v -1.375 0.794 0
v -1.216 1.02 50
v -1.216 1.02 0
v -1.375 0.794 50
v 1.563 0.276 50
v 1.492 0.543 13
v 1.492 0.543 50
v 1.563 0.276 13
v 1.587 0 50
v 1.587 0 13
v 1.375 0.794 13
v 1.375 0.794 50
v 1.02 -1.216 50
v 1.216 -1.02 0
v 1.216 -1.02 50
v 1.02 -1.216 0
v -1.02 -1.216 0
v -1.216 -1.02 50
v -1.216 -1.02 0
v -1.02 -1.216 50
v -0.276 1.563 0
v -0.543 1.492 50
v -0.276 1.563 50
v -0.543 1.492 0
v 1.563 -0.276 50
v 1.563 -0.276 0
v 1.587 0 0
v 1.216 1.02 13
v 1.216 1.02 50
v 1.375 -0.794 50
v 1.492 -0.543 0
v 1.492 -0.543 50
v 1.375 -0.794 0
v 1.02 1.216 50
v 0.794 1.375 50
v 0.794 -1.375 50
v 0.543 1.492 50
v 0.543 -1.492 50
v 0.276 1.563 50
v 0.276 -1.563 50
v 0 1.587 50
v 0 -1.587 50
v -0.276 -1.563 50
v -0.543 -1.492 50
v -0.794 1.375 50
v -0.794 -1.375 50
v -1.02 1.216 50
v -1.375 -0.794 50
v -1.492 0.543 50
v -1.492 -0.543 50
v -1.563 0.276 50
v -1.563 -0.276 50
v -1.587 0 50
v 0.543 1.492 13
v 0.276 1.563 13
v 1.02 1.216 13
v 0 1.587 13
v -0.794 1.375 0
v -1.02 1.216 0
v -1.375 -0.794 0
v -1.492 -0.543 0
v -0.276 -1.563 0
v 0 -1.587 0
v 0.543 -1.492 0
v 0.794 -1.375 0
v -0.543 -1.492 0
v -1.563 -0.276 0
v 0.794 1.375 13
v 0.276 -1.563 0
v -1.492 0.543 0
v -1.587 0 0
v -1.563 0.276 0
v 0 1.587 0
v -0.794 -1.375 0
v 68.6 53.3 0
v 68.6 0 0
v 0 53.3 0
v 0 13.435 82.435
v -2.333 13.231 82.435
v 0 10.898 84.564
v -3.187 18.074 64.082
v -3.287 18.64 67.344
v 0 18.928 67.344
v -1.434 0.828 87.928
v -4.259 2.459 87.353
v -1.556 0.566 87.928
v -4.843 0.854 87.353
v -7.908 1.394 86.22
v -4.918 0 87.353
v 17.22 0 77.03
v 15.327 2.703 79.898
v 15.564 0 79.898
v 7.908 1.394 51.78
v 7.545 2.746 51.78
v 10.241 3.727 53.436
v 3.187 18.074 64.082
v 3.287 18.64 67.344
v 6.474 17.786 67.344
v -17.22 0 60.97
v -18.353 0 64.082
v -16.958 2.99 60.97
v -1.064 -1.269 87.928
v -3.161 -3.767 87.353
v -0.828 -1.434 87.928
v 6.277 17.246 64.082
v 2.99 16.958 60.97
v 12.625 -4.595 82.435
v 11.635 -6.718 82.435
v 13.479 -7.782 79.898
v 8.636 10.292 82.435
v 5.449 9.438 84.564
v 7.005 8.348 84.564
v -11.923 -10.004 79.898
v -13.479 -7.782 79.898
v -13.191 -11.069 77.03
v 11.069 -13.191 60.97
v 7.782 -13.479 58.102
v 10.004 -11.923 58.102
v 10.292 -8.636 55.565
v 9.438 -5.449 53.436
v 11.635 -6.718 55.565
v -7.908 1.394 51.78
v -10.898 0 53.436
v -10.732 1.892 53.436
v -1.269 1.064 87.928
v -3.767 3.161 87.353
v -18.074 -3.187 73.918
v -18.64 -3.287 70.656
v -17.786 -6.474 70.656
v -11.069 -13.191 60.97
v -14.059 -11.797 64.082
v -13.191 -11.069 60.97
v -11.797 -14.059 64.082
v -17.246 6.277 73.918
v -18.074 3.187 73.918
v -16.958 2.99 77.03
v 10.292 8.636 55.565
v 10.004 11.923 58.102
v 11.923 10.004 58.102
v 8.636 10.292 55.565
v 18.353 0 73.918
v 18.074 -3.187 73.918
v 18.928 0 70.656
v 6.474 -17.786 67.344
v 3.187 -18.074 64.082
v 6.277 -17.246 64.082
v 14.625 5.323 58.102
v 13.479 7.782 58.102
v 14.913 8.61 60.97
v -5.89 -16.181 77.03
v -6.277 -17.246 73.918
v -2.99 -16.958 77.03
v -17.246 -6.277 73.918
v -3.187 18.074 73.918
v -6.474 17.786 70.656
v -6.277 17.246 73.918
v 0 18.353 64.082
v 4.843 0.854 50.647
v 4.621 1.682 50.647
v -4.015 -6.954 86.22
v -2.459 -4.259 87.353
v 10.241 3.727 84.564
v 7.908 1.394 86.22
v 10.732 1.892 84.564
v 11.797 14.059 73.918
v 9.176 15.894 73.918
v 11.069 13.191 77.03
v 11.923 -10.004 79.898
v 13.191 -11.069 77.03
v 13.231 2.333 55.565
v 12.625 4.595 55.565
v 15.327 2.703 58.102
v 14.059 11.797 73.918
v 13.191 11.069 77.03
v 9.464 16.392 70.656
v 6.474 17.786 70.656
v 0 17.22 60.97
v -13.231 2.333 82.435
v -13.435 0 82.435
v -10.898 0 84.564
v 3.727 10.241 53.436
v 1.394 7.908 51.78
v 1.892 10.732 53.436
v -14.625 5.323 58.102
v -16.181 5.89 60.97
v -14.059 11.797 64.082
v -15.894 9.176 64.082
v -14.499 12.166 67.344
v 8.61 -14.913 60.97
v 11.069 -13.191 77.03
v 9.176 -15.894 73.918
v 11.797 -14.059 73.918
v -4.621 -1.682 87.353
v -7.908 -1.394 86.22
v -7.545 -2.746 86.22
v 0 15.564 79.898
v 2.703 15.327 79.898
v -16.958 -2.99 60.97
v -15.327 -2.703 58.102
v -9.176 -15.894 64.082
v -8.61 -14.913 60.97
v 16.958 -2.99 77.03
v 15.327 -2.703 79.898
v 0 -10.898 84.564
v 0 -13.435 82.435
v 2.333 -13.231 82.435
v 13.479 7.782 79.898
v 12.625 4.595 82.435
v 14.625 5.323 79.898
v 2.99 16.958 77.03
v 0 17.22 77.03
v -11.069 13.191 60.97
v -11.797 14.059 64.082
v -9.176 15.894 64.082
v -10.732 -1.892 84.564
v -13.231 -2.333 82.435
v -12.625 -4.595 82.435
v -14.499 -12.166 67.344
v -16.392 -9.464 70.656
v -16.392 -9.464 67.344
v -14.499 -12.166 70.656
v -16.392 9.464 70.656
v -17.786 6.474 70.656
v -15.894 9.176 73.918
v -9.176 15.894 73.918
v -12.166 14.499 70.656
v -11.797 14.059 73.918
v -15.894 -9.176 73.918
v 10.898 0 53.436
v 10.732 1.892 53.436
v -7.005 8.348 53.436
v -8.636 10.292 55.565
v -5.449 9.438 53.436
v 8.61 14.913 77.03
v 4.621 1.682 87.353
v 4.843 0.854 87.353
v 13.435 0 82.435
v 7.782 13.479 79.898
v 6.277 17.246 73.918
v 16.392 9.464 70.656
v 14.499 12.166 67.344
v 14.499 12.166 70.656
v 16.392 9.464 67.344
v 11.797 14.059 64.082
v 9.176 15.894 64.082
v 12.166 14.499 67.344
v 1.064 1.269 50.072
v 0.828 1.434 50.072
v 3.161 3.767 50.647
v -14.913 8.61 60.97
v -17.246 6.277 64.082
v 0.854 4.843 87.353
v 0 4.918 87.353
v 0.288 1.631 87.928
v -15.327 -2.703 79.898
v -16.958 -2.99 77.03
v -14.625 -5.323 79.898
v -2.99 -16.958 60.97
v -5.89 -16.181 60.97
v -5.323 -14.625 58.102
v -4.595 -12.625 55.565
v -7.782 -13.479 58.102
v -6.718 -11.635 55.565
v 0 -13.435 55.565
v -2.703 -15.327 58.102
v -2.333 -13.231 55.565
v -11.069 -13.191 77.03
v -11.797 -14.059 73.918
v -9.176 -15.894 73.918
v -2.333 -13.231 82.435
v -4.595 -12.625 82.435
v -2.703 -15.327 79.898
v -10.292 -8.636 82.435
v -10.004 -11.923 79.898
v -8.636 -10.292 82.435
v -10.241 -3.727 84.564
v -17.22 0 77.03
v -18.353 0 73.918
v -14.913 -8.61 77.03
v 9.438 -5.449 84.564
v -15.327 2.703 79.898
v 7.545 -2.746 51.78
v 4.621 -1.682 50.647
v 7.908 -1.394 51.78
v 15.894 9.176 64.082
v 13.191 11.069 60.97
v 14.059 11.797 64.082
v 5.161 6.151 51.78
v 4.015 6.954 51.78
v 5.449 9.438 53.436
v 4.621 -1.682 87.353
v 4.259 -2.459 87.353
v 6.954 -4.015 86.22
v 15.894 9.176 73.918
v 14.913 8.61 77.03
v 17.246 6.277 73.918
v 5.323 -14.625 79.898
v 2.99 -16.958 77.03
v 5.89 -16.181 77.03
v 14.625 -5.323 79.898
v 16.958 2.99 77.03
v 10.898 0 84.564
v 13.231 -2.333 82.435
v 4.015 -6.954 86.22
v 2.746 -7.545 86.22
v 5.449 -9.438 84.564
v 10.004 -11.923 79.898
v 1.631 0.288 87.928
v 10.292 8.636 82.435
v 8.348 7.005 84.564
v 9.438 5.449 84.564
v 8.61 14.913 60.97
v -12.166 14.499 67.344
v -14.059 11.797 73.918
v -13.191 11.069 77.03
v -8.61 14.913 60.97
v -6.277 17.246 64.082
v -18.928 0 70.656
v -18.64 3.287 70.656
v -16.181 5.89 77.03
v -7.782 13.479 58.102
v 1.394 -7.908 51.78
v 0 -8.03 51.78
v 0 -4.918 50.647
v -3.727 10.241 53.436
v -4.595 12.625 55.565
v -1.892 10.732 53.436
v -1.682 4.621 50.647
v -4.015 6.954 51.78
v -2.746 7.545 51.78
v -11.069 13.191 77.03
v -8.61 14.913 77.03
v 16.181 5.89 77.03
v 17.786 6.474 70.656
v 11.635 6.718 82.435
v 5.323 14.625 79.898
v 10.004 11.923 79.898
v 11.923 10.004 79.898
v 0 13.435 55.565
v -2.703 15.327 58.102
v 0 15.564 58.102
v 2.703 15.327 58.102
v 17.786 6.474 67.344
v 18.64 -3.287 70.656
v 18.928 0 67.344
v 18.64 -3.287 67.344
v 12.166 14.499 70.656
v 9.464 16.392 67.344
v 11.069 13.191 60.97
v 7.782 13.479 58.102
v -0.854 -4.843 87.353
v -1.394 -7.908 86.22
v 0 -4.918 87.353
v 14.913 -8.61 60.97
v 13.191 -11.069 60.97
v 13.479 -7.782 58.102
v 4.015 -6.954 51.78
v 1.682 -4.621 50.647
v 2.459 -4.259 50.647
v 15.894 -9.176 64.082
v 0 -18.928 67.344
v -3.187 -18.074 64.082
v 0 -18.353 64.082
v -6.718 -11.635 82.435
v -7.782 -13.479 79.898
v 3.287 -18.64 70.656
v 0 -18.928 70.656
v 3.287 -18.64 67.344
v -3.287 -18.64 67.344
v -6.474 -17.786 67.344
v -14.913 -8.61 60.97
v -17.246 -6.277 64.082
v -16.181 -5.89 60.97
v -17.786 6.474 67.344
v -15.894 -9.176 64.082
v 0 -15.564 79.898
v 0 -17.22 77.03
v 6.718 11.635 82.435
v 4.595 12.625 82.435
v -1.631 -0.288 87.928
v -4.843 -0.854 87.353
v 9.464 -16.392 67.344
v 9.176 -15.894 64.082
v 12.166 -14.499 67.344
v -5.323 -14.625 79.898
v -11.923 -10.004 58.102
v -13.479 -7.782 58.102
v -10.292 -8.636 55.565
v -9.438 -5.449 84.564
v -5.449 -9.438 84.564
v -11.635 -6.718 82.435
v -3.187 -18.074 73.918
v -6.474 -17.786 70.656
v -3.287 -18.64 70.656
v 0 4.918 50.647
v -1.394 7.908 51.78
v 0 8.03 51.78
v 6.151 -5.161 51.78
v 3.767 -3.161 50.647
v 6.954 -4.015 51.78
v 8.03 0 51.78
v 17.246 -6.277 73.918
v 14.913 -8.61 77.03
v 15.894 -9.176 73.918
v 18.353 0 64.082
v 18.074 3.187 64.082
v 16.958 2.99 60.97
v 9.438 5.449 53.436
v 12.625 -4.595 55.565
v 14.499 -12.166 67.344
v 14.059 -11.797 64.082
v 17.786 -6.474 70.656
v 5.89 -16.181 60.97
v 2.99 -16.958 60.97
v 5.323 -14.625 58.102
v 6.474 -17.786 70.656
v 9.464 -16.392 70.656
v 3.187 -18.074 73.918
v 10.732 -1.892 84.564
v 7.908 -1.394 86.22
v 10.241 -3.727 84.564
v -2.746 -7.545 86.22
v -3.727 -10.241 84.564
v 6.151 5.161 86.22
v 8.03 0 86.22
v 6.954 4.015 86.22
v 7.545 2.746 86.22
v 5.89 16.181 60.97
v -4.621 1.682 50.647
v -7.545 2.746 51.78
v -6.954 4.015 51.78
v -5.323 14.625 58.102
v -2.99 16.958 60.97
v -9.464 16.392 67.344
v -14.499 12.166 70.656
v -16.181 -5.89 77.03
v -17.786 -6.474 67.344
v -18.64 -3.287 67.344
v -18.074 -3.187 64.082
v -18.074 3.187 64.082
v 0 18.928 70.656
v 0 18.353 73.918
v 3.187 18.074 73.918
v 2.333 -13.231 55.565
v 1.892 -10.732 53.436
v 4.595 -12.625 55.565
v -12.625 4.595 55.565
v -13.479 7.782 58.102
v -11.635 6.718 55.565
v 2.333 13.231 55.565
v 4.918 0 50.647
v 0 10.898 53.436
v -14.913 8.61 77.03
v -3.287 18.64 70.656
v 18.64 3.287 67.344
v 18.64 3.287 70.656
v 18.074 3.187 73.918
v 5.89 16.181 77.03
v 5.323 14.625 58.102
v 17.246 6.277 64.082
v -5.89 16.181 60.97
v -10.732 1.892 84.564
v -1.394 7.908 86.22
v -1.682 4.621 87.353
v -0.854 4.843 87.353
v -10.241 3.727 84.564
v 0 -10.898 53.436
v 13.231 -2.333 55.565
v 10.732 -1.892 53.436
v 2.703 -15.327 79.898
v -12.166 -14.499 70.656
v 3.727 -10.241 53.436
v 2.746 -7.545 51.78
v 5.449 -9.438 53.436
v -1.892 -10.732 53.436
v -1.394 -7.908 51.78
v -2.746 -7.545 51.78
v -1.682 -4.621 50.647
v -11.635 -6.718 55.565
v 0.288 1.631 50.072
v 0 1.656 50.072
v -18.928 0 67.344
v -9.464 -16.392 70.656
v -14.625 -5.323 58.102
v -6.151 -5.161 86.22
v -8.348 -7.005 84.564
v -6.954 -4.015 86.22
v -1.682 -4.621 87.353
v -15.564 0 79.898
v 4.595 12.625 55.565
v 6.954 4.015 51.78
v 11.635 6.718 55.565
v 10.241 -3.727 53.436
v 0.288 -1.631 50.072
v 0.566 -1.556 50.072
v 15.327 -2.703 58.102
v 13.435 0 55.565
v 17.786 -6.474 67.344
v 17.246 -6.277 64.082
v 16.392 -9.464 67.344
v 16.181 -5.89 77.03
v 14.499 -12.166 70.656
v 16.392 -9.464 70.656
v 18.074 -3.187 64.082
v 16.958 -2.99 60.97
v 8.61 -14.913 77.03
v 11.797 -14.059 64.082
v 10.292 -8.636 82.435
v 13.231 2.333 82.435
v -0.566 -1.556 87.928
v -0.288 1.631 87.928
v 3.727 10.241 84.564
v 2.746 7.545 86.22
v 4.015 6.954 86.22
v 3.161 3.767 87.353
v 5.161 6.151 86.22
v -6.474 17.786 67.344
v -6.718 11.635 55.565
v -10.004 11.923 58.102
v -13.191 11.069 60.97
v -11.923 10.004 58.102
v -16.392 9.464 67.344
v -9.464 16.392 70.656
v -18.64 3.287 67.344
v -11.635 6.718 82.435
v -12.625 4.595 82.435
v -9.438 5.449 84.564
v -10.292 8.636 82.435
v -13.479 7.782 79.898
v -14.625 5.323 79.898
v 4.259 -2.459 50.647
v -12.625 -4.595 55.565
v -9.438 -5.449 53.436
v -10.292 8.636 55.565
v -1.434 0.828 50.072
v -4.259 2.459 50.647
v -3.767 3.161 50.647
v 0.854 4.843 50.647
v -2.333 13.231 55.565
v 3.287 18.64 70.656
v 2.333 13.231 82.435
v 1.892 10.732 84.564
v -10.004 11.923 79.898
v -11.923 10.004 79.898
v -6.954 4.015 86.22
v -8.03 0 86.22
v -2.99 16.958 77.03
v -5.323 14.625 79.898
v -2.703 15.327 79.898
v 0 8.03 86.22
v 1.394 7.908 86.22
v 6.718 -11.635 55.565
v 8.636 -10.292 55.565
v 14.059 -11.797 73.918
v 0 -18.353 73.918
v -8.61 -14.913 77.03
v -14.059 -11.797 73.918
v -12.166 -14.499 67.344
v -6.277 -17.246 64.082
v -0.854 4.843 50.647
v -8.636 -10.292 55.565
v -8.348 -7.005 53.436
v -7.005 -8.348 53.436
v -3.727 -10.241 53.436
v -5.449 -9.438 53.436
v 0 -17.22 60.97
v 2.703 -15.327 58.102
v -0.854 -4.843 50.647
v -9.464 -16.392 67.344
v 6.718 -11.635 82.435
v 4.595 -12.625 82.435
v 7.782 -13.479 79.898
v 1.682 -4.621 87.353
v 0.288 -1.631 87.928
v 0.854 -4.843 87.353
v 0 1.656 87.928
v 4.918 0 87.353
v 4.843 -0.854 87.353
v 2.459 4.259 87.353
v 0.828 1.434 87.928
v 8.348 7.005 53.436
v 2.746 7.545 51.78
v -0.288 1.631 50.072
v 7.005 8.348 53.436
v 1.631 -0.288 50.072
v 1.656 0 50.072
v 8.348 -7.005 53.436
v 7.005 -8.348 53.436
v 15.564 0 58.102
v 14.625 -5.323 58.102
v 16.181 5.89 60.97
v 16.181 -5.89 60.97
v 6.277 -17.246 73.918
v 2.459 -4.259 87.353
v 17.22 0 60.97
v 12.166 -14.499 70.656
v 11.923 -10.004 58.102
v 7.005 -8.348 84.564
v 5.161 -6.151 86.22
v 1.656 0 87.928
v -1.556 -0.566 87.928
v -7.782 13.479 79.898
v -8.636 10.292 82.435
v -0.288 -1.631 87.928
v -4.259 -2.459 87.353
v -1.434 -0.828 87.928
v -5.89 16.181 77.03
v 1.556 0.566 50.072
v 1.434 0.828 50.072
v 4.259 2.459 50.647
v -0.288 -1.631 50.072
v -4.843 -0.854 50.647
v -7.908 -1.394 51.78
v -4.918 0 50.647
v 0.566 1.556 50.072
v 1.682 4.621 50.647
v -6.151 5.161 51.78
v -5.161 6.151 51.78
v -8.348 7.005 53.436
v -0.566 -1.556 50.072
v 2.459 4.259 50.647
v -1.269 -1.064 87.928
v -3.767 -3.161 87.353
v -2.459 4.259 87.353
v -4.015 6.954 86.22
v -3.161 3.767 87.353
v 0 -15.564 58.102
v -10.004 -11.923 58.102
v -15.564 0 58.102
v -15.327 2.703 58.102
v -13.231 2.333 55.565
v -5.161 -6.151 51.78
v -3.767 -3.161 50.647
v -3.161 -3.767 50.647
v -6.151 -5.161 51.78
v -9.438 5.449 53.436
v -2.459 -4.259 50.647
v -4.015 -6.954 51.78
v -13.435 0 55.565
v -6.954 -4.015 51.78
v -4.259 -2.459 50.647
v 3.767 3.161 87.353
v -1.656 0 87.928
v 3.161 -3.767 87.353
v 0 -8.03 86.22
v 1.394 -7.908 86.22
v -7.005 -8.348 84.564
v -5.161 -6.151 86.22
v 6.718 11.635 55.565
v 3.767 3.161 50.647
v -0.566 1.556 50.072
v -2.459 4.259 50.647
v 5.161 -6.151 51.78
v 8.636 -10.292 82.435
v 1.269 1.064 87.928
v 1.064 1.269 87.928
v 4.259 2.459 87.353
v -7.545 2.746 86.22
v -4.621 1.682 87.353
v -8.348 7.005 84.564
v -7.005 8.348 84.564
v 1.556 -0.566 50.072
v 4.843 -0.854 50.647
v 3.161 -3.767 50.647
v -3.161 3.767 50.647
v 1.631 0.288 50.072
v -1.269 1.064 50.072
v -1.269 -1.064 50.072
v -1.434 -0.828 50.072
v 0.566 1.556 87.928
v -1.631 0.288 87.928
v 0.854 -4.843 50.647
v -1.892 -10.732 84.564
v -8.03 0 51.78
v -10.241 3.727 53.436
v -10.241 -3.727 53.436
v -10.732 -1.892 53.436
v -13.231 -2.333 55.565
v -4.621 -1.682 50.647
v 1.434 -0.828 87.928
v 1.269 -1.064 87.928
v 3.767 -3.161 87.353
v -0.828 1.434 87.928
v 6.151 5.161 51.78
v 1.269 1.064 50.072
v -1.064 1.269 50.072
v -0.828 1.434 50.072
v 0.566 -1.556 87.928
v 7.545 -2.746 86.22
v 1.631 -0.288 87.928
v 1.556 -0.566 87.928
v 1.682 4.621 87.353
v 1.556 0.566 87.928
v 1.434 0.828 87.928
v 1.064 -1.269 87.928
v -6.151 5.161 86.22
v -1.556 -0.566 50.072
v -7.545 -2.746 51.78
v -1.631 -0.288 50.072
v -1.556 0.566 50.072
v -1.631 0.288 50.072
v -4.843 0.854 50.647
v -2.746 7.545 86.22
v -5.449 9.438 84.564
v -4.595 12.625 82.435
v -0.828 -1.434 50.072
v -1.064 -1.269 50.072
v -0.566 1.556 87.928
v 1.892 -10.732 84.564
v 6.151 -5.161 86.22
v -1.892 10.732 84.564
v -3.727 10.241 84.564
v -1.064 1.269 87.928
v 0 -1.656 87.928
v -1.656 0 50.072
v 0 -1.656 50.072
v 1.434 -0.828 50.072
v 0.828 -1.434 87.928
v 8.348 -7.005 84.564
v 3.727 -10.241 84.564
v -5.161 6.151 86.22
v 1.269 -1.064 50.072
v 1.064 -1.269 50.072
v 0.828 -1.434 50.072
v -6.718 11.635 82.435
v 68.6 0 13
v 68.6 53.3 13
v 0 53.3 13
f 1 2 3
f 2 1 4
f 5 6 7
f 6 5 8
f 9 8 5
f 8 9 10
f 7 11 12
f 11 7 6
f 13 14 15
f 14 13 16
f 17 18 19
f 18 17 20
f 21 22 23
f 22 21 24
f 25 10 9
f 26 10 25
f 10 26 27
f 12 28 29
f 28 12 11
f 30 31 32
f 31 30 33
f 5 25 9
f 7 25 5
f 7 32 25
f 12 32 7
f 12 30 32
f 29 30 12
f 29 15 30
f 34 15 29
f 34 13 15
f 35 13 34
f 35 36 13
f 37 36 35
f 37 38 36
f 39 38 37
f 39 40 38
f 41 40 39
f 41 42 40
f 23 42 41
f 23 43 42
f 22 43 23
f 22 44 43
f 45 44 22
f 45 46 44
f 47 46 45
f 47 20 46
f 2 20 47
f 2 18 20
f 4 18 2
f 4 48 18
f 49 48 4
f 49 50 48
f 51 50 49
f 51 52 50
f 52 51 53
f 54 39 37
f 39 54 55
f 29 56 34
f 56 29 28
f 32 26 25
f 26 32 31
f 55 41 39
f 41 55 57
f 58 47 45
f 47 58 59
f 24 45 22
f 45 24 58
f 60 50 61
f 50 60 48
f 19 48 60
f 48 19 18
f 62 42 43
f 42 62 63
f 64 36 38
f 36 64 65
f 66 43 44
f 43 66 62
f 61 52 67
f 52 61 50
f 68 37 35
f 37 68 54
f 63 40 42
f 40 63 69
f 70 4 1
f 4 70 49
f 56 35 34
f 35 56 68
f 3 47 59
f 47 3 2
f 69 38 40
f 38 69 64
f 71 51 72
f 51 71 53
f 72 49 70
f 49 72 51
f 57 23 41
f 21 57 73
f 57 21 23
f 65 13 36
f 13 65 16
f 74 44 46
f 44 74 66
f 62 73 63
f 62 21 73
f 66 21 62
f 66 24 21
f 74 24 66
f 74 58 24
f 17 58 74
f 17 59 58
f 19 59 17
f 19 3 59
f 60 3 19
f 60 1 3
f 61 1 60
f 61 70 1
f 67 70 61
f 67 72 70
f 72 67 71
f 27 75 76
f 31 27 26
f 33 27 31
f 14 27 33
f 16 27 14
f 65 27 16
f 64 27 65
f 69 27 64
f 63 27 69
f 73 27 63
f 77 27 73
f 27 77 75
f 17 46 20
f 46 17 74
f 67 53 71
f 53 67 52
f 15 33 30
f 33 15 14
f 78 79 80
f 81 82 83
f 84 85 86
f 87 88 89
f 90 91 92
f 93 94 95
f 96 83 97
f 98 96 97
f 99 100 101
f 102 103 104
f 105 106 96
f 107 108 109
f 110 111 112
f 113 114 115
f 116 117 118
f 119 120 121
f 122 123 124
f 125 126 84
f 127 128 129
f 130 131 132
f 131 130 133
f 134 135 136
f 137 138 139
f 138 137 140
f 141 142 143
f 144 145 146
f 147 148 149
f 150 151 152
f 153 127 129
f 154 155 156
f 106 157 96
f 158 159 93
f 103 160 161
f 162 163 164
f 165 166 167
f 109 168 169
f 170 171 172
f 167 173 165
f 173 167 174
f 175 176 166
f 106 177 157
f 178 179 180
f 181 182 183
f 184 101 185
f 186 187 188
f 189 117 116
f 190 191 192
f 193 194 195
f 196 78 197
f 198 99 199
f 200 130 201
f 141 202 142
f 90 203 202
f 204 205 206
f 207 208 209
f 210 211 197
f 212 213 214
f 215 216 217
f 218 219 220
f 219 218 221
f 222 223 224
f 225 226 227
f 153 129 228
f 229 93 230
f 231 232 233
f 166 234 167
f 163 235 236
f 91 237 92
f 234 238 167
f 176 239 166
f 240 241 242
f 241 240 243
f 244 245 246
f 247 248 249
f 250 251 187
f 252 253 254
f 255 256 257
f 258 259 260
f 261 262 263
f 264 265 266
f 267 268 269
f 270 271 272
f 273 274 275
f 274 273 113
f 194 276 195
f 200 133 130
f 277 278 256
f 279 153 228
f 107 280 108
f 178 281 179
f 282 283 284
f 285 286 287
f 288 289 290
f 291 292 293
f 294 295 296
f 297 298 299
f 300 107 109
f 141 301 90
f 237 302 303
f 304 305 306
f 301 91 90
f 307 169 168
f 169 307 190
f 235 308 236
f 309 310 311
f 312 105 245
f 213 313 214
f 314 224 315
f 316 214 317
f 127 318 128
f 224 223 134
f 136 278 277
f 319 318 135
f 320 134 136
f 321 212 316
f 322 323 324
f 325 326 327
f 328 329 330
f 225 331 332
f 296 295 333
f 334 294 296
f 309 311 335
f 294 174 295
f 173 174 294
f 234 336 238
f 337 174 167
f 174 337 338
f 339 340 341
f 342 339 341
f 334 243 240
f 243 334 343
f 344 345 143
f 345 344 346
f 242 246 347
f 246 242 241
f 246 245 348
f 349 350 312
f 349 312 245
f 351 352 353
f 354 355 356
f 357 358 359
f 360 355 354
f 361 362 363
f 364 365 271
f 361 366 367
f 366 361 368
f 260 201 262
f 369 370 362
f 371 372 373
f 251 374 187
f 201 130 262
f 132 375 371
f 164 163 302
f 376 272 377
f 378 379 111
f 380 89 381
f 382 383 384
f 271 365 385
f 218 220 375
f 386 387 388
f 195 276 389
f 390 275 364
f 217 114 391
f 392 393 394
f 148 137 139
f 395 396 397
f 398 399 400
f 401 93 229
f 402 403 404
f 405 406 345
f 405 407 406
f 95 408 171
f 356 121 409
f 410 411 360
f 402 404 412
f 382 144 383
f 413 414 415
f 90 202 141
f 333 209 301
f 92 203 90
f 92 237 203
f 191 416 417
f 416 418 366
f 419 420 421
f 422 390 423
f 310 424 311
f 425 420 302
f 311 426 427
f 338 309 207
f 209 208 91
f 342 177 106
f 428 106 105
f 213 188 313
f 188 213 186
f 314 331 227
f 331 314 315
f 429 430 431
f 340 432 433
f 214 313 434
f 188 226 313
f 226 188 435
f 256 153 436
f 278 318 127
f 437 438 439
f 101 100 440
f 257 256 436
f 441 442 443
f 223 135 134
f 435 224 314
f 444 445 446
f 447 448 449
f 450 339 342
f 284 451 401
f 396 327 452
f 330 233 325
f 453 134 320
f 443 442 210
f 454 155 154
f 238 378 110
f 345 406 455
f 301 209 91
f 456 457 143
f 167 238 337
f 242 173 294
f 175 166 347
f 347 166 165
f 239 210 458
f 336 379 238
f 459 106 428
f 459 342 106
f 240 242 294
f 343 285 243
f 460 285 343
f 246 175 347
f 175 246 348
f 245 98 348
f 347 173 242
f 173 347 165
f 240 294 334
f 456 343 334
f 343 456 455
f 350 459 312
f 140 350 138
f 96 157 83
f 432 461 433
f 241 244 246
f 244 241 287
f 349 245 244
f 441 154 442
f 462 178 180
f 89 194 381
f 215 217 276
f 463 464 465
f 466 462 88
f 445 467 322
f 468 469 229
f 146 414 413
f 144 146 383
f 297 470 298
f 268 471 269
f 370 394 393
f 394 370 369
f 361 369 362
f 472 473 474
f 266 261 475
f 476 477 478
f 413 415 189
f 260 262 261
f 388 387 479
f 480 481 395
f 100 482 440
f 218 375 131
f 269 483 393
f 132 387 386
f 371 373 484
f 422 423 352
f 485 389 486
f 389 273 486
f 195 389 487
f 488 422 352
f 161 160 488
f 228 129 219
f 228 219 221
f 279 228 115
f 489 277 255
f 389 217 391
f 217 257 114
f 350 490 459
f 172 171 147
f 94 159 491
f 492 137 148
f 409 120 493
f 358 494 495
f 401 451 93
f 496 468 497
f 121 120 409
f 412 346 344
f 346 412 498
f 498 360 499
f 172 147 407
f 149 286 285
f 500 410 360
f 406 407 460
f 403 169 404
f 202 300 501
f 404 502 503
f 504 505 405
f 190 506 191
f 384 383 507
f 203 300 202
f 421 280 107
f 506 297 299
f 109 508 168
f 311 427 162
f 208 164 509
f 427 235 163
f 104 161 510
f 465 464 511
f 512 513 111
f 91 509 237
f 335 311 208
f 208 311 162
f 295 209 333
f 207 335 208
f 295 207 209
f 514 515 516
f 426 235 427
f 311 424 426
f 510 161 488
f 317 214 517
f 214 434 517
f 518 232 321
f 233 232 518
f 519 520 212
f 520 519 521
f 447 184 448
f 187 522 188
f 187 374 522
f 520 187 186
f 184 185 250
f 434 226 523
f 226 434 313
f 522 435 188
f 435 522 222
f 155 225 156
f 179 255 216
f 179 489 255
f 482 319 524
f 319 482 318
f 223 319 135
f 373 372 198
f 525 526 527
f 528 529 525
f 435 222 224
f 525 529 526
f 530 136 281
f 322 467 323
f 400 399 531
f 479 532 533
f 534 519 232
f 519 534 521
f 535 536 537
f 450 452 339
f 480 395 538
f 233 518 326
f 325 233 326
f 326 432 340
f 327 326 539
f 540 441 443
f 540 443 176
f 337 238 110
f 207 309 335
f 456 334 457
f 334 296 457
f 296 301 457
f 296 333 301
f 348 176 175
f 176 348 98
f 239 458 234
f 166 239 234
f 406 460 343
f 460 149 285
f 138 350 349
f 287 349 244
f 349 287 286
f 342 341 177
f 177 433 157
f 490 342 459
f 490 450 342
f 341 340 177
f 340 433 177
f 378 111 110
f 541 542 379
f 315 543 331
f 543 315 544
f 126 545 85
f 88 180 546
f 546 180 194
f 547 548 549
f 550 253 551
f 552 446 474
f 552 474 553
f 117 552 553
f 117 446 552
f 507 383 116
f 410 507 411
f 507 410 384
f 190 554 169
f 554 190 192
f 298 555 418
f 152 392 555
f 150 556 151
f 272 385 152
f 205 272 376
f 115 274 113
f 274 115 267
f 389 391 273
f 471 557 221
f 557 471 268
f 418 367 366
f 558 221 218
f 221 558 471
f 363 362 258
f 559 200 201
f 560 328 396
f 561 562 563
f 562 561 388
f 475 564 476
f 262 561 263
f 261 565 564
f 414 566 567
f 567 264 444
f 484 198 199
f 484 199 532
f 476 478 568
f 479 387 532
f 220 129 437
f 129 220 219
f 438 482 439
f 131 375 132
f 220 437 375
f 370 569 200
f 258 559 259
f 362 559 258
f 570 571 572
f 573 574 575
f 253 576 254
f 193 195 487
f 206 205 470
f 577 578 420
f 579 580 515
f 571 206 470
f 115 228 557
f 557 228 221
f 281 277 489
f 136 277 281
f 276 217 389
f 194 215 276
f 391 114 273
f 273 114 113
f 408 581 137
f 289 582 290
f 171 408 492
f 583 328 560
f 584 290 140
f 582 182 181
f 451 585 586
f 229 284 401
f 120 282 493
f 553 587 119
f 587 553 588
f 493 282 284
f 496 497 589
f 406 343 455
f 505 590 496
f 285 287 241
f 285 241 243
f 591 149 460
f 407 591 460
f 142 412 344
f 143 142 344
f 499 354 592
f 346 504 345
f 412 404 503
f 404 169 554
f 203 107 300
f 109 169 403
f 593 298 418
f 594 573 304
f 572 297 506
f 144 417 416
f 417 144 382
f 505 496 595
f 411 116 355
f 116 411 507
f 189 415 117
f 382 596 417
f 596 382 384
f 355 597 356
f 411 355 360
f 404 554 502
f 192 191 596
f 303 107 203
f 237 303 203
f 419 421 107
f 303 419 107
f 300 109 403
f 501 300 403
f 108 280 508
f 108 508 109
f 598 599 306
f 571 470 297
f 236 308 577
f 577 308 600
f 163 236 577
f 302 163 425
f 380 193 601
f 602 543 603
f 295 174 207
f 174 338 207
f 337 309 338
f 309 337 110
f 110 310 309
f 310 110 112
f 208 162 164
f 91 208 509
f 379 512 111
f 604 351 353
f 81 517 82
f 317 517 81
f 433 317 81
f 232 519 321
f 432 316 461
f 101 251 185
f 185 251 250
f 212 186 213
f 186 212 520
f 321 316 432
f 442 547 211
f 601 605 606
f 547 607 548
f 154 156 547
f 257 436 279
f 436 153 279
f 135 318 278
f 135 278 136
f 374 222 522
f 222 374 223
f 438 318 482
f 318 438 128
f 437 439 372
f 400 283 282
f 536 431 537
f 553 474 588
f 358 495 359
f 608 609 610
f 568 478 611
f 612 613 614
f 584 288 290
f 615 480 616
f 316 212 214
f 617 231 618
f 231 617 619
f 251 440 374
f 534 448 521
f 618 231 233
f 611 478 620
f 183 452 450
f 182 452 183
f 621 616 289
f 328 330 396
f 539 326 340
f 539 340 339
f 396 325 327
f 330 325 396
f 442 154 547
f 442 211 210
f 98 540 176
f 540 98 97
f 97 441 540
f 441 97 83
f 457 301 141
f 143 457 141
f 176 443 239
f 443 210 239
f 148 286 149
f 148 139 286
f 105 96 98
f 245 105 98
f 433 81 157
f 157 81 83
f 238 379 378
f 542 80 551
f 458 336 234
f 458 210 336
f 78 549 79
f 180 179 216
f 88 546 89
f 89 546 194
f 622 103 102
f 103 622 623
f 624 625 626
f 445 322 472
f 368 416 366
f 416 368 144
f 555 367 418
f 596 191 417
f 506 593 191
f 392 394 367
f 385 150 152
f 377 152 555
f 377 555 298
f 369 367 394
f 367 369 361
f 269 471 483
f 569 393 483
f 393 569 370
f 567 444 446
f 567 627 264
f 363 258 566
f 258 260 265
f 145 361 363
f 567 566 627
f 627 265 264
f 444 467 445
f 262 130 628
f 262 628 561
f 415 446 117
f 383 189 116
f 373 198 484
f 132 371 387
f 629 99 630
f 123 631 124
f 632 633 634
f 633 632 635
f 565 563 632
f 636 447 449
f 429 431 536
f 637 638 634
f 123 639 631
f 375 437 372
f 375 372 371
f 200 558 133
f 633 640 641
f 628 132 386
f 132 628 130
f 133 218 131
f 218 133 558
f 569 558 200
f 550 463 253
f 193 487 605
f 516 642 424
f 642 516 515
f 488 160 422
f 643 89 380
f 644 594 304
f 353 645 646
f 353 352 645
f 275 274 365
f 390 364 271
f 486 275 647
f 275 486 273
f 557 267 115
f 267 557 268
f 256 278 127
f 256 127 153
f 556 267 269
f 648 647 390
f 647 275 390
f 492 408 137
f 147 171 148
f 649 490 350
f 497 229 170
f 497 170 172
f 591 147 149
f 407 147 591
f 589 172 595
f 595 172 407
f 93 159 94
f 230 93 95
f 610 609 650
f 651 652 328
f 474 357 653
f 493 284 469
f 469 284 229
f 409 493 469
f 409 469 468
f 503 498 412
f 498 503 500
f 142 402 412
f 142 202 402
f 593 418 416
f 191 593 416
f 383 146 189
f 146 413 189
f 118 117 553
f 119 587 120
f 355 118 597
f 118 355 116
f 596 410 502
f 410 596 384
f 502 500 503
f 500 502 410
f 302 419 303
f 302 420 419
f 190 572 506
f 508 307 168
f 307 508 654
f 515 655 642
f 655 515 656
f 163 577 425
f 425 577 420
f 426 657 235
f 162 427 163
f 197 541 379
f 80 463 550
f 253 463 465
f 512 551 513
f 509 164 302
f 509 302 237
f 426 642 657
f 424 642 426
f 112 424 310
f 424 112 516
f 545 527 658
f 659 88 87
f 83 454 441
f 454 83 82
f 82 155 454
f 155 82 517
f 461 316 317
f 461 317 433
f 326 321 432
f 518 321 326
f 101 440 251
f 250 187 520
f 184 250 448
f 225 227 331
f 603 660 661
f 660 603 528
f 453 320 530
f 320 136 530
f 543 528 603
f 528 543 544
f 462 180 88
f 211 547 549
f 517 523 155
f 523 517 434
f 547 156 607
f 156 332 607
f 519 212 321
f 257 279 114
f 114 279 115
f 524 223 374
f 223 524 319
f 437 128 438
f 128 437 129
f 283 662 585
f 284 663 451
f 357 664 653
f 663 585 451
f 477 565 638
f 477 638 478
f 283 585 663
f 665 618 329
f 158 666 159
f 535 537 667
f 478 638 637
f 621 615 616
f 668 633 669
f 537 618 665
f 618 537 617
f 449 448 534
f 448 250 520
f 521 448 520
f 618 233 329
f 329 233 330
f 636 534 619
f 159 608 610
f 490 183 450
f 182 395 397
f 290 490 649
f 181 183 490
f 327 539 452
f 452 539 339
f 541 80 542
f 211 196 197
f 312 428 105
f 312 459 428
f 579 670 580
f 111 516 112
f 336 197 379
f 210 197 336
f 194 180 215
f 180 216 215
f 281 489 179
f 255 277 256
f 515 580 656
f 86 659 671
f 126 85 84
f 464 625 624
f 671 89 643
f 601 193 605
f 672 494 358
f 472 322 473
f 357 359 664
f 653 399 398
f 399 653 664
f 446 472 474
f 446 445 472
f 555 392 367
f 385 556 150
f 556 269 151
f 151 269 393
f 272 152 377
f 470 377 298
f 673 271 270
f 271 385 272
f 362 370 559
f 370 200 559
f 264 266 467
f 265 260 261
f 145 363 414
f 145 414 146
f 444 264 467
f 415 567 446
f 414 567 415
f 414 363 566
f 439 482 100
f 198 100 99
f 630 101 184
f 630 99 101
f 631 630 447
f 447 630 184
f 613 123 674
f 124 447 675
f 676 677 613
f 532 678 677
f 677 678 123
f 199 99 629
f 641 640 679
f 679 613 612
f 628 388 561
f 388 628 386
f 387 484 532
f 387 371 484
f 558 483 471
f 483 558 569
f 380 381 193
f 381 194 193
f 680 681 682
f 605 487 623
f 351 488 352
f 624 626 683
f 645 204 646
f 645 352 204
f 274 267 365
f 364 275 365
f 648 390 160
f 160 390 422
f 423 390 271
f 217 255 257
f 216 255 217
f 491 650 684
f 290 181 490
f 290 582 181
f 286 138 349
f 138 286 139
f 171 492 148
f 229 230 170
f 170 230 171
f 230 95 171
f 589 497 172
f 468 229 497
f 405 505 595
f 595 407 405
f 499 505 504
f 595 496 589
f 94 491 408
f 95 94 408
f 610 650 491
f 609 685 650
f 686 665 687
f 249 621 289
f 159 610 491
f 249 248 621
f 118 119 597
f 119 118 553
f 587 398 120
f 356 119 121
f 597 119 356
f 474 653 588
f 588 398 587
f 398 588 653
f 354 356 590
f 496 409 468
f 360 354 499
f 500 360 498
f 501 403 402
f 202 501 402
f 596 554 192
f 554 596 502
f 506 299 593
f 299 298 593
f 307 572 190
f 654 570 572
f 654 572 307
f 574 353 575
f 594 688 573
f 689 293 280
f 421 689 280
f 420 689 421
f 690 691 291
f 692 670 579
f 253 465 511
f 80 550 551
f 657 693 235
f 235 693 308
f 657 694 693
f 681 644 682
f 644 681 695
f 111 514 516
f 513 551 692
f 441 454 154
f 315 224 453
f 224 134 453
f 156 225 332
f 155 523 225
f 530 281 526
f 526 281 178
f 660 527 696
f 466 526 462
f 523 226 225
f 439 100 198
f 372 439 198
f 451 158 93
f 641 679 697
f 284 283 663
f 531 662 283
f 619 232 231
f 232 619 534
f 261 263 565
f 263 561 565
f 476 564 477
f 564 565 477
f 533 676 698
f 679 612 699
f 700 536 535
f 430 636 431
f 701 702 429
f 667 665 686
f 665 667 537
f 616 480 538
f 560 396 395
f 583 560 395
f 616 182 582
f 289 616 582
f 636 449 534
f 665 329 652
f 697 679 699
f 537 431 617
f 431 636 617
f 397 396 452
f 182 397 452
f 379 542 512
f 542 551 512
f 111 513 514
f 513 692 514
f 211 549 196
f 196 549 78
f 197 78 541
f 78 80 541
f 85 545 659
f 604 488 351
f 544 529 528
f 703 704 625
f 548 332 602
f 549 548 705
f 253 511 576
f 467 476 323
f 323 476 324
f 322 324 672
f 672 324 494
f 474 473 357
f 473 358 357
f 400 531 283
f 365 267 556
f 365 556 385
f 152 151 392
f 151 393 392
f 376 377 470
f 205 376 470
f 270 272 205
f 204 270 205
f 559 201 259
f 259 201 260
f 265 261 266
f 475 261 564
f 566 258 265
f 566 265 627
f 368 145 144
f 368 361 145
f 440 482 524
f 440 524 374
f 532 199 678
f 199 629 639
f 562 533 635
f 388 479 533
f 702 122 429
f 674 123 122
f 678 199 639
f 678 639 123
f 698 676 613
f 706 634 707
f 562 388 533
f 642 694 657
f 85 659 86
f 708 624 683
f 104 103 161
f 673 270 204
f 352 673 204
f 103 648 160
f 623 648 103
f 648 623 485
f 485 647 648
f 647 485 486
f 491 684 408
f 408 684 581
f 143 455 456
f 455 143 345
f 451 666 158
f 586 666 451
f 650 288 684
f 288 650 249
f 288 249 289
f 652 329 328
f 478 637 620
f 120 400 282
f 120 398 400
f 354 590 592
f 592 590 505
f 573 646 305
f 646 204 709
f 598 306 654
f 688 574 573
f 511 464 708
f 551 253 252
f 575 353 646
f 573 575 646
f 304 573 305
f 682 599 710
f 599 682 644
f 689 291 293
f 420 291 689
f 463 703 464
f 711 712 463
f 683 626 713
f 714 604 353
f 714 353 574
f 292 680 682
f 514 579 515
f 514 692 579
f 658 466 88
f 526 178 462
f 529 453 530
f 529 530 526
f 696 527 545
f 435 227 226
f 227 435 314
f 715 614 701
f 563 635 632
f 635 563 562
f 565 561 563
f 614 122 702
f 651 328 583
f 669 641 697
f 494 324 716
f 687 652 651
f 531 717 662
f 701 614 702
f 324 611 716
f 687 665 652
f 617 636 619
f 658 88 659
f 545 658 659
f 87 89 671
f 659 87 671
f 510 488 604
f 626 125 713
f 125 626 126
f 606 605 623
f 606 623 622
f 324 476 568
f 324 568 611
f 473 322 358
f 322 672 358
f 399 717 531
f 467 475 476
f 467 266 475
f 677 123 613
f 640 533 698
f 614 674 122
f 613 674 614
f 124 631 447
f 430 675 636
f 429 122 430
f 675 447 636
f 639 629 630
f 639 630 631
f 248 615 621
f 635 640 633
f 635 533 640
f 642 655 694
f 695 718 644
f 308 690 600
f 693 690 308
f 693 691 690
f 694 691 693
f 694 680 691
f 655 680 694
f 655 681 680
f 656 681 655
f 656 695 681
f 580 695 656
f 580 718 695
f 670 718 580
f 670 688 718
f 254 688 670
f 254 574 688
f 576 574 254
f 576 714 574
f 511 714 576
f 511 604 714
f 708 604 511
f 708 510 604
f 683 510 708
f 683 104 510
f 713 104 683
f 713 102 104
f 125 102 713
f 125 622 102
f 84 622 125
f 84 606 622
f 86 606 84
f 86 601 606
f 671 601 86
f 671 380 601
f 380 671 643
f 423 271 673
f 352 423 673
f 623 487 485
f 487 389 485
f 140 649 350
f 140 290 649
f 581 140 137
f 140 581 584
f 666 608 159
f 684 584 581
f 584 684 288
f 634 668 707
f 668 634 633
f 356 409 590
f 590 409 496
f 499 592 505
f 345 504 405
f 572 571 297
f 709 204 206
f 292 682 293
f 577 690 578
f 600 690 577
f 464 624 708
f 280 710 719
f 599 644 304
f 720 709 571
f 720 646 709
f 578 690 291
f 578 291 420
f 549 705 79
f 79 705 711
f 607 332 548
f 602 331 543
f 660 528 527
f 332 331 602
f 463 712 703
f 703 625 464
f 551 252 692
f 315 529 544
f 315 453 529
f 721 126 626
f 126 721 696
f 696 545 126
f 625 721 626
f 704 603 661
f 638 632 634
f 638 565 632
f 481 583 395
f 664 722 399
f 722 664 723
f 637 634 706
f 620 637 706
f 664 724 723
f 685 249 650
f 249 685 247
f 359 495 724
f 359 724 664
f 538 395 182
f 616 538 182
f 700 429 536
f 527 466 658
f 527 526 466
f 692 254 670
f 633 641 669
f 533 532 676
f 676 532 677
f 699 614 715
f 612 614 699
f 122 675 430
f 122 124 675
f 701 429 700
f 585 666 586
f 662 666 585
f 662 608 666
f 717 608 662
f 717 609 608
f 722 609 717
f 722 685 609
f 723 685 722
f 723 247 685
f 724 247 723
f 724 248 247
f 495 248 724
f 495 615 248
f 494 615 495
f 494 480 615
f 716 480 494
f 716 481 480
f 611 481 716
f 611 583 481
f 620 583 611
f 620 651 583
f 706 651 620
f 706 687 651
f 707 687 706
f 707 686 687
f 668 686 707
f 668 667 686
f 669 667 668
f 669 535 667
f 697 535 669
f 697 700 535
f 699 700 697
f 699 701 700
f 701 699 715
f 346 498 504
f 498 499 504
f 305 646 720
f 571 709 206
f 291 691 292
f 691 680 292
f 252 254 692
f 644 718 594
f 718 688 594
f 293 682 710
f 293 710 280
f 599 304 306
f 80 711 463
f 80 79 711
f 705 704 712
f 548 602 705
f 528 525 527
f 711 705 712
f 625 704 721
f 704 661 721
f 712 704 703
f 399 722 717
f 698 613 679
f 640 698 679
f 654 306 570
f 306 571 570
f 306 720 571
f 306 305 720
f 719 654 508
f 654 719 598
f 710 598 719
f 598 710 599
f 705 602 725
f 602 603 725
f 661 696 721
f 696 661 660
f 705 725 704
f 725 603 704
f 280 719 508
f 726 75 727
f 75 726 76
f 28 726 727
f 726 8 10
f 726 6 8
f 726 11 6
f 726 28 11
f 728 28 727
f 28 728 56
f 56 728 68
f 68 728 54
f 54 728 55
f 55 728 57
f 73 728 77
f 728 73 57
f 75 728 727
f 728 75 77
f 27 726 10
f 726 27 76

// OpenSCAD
$fn = 36;



// box width is 4.76 mm (3/16 in)
// moon is 38 mm diameter


//stem is 50 mm long
// 1/8 inch diameter, which is 3.175 mm diameter
cylinder(h=50, d=3.175);


color("green")
translate([0,0,69])
// moon sphere
sphere(d=38);

color("red")
// Arduino
cube([68.6, 53.3, 13]);
